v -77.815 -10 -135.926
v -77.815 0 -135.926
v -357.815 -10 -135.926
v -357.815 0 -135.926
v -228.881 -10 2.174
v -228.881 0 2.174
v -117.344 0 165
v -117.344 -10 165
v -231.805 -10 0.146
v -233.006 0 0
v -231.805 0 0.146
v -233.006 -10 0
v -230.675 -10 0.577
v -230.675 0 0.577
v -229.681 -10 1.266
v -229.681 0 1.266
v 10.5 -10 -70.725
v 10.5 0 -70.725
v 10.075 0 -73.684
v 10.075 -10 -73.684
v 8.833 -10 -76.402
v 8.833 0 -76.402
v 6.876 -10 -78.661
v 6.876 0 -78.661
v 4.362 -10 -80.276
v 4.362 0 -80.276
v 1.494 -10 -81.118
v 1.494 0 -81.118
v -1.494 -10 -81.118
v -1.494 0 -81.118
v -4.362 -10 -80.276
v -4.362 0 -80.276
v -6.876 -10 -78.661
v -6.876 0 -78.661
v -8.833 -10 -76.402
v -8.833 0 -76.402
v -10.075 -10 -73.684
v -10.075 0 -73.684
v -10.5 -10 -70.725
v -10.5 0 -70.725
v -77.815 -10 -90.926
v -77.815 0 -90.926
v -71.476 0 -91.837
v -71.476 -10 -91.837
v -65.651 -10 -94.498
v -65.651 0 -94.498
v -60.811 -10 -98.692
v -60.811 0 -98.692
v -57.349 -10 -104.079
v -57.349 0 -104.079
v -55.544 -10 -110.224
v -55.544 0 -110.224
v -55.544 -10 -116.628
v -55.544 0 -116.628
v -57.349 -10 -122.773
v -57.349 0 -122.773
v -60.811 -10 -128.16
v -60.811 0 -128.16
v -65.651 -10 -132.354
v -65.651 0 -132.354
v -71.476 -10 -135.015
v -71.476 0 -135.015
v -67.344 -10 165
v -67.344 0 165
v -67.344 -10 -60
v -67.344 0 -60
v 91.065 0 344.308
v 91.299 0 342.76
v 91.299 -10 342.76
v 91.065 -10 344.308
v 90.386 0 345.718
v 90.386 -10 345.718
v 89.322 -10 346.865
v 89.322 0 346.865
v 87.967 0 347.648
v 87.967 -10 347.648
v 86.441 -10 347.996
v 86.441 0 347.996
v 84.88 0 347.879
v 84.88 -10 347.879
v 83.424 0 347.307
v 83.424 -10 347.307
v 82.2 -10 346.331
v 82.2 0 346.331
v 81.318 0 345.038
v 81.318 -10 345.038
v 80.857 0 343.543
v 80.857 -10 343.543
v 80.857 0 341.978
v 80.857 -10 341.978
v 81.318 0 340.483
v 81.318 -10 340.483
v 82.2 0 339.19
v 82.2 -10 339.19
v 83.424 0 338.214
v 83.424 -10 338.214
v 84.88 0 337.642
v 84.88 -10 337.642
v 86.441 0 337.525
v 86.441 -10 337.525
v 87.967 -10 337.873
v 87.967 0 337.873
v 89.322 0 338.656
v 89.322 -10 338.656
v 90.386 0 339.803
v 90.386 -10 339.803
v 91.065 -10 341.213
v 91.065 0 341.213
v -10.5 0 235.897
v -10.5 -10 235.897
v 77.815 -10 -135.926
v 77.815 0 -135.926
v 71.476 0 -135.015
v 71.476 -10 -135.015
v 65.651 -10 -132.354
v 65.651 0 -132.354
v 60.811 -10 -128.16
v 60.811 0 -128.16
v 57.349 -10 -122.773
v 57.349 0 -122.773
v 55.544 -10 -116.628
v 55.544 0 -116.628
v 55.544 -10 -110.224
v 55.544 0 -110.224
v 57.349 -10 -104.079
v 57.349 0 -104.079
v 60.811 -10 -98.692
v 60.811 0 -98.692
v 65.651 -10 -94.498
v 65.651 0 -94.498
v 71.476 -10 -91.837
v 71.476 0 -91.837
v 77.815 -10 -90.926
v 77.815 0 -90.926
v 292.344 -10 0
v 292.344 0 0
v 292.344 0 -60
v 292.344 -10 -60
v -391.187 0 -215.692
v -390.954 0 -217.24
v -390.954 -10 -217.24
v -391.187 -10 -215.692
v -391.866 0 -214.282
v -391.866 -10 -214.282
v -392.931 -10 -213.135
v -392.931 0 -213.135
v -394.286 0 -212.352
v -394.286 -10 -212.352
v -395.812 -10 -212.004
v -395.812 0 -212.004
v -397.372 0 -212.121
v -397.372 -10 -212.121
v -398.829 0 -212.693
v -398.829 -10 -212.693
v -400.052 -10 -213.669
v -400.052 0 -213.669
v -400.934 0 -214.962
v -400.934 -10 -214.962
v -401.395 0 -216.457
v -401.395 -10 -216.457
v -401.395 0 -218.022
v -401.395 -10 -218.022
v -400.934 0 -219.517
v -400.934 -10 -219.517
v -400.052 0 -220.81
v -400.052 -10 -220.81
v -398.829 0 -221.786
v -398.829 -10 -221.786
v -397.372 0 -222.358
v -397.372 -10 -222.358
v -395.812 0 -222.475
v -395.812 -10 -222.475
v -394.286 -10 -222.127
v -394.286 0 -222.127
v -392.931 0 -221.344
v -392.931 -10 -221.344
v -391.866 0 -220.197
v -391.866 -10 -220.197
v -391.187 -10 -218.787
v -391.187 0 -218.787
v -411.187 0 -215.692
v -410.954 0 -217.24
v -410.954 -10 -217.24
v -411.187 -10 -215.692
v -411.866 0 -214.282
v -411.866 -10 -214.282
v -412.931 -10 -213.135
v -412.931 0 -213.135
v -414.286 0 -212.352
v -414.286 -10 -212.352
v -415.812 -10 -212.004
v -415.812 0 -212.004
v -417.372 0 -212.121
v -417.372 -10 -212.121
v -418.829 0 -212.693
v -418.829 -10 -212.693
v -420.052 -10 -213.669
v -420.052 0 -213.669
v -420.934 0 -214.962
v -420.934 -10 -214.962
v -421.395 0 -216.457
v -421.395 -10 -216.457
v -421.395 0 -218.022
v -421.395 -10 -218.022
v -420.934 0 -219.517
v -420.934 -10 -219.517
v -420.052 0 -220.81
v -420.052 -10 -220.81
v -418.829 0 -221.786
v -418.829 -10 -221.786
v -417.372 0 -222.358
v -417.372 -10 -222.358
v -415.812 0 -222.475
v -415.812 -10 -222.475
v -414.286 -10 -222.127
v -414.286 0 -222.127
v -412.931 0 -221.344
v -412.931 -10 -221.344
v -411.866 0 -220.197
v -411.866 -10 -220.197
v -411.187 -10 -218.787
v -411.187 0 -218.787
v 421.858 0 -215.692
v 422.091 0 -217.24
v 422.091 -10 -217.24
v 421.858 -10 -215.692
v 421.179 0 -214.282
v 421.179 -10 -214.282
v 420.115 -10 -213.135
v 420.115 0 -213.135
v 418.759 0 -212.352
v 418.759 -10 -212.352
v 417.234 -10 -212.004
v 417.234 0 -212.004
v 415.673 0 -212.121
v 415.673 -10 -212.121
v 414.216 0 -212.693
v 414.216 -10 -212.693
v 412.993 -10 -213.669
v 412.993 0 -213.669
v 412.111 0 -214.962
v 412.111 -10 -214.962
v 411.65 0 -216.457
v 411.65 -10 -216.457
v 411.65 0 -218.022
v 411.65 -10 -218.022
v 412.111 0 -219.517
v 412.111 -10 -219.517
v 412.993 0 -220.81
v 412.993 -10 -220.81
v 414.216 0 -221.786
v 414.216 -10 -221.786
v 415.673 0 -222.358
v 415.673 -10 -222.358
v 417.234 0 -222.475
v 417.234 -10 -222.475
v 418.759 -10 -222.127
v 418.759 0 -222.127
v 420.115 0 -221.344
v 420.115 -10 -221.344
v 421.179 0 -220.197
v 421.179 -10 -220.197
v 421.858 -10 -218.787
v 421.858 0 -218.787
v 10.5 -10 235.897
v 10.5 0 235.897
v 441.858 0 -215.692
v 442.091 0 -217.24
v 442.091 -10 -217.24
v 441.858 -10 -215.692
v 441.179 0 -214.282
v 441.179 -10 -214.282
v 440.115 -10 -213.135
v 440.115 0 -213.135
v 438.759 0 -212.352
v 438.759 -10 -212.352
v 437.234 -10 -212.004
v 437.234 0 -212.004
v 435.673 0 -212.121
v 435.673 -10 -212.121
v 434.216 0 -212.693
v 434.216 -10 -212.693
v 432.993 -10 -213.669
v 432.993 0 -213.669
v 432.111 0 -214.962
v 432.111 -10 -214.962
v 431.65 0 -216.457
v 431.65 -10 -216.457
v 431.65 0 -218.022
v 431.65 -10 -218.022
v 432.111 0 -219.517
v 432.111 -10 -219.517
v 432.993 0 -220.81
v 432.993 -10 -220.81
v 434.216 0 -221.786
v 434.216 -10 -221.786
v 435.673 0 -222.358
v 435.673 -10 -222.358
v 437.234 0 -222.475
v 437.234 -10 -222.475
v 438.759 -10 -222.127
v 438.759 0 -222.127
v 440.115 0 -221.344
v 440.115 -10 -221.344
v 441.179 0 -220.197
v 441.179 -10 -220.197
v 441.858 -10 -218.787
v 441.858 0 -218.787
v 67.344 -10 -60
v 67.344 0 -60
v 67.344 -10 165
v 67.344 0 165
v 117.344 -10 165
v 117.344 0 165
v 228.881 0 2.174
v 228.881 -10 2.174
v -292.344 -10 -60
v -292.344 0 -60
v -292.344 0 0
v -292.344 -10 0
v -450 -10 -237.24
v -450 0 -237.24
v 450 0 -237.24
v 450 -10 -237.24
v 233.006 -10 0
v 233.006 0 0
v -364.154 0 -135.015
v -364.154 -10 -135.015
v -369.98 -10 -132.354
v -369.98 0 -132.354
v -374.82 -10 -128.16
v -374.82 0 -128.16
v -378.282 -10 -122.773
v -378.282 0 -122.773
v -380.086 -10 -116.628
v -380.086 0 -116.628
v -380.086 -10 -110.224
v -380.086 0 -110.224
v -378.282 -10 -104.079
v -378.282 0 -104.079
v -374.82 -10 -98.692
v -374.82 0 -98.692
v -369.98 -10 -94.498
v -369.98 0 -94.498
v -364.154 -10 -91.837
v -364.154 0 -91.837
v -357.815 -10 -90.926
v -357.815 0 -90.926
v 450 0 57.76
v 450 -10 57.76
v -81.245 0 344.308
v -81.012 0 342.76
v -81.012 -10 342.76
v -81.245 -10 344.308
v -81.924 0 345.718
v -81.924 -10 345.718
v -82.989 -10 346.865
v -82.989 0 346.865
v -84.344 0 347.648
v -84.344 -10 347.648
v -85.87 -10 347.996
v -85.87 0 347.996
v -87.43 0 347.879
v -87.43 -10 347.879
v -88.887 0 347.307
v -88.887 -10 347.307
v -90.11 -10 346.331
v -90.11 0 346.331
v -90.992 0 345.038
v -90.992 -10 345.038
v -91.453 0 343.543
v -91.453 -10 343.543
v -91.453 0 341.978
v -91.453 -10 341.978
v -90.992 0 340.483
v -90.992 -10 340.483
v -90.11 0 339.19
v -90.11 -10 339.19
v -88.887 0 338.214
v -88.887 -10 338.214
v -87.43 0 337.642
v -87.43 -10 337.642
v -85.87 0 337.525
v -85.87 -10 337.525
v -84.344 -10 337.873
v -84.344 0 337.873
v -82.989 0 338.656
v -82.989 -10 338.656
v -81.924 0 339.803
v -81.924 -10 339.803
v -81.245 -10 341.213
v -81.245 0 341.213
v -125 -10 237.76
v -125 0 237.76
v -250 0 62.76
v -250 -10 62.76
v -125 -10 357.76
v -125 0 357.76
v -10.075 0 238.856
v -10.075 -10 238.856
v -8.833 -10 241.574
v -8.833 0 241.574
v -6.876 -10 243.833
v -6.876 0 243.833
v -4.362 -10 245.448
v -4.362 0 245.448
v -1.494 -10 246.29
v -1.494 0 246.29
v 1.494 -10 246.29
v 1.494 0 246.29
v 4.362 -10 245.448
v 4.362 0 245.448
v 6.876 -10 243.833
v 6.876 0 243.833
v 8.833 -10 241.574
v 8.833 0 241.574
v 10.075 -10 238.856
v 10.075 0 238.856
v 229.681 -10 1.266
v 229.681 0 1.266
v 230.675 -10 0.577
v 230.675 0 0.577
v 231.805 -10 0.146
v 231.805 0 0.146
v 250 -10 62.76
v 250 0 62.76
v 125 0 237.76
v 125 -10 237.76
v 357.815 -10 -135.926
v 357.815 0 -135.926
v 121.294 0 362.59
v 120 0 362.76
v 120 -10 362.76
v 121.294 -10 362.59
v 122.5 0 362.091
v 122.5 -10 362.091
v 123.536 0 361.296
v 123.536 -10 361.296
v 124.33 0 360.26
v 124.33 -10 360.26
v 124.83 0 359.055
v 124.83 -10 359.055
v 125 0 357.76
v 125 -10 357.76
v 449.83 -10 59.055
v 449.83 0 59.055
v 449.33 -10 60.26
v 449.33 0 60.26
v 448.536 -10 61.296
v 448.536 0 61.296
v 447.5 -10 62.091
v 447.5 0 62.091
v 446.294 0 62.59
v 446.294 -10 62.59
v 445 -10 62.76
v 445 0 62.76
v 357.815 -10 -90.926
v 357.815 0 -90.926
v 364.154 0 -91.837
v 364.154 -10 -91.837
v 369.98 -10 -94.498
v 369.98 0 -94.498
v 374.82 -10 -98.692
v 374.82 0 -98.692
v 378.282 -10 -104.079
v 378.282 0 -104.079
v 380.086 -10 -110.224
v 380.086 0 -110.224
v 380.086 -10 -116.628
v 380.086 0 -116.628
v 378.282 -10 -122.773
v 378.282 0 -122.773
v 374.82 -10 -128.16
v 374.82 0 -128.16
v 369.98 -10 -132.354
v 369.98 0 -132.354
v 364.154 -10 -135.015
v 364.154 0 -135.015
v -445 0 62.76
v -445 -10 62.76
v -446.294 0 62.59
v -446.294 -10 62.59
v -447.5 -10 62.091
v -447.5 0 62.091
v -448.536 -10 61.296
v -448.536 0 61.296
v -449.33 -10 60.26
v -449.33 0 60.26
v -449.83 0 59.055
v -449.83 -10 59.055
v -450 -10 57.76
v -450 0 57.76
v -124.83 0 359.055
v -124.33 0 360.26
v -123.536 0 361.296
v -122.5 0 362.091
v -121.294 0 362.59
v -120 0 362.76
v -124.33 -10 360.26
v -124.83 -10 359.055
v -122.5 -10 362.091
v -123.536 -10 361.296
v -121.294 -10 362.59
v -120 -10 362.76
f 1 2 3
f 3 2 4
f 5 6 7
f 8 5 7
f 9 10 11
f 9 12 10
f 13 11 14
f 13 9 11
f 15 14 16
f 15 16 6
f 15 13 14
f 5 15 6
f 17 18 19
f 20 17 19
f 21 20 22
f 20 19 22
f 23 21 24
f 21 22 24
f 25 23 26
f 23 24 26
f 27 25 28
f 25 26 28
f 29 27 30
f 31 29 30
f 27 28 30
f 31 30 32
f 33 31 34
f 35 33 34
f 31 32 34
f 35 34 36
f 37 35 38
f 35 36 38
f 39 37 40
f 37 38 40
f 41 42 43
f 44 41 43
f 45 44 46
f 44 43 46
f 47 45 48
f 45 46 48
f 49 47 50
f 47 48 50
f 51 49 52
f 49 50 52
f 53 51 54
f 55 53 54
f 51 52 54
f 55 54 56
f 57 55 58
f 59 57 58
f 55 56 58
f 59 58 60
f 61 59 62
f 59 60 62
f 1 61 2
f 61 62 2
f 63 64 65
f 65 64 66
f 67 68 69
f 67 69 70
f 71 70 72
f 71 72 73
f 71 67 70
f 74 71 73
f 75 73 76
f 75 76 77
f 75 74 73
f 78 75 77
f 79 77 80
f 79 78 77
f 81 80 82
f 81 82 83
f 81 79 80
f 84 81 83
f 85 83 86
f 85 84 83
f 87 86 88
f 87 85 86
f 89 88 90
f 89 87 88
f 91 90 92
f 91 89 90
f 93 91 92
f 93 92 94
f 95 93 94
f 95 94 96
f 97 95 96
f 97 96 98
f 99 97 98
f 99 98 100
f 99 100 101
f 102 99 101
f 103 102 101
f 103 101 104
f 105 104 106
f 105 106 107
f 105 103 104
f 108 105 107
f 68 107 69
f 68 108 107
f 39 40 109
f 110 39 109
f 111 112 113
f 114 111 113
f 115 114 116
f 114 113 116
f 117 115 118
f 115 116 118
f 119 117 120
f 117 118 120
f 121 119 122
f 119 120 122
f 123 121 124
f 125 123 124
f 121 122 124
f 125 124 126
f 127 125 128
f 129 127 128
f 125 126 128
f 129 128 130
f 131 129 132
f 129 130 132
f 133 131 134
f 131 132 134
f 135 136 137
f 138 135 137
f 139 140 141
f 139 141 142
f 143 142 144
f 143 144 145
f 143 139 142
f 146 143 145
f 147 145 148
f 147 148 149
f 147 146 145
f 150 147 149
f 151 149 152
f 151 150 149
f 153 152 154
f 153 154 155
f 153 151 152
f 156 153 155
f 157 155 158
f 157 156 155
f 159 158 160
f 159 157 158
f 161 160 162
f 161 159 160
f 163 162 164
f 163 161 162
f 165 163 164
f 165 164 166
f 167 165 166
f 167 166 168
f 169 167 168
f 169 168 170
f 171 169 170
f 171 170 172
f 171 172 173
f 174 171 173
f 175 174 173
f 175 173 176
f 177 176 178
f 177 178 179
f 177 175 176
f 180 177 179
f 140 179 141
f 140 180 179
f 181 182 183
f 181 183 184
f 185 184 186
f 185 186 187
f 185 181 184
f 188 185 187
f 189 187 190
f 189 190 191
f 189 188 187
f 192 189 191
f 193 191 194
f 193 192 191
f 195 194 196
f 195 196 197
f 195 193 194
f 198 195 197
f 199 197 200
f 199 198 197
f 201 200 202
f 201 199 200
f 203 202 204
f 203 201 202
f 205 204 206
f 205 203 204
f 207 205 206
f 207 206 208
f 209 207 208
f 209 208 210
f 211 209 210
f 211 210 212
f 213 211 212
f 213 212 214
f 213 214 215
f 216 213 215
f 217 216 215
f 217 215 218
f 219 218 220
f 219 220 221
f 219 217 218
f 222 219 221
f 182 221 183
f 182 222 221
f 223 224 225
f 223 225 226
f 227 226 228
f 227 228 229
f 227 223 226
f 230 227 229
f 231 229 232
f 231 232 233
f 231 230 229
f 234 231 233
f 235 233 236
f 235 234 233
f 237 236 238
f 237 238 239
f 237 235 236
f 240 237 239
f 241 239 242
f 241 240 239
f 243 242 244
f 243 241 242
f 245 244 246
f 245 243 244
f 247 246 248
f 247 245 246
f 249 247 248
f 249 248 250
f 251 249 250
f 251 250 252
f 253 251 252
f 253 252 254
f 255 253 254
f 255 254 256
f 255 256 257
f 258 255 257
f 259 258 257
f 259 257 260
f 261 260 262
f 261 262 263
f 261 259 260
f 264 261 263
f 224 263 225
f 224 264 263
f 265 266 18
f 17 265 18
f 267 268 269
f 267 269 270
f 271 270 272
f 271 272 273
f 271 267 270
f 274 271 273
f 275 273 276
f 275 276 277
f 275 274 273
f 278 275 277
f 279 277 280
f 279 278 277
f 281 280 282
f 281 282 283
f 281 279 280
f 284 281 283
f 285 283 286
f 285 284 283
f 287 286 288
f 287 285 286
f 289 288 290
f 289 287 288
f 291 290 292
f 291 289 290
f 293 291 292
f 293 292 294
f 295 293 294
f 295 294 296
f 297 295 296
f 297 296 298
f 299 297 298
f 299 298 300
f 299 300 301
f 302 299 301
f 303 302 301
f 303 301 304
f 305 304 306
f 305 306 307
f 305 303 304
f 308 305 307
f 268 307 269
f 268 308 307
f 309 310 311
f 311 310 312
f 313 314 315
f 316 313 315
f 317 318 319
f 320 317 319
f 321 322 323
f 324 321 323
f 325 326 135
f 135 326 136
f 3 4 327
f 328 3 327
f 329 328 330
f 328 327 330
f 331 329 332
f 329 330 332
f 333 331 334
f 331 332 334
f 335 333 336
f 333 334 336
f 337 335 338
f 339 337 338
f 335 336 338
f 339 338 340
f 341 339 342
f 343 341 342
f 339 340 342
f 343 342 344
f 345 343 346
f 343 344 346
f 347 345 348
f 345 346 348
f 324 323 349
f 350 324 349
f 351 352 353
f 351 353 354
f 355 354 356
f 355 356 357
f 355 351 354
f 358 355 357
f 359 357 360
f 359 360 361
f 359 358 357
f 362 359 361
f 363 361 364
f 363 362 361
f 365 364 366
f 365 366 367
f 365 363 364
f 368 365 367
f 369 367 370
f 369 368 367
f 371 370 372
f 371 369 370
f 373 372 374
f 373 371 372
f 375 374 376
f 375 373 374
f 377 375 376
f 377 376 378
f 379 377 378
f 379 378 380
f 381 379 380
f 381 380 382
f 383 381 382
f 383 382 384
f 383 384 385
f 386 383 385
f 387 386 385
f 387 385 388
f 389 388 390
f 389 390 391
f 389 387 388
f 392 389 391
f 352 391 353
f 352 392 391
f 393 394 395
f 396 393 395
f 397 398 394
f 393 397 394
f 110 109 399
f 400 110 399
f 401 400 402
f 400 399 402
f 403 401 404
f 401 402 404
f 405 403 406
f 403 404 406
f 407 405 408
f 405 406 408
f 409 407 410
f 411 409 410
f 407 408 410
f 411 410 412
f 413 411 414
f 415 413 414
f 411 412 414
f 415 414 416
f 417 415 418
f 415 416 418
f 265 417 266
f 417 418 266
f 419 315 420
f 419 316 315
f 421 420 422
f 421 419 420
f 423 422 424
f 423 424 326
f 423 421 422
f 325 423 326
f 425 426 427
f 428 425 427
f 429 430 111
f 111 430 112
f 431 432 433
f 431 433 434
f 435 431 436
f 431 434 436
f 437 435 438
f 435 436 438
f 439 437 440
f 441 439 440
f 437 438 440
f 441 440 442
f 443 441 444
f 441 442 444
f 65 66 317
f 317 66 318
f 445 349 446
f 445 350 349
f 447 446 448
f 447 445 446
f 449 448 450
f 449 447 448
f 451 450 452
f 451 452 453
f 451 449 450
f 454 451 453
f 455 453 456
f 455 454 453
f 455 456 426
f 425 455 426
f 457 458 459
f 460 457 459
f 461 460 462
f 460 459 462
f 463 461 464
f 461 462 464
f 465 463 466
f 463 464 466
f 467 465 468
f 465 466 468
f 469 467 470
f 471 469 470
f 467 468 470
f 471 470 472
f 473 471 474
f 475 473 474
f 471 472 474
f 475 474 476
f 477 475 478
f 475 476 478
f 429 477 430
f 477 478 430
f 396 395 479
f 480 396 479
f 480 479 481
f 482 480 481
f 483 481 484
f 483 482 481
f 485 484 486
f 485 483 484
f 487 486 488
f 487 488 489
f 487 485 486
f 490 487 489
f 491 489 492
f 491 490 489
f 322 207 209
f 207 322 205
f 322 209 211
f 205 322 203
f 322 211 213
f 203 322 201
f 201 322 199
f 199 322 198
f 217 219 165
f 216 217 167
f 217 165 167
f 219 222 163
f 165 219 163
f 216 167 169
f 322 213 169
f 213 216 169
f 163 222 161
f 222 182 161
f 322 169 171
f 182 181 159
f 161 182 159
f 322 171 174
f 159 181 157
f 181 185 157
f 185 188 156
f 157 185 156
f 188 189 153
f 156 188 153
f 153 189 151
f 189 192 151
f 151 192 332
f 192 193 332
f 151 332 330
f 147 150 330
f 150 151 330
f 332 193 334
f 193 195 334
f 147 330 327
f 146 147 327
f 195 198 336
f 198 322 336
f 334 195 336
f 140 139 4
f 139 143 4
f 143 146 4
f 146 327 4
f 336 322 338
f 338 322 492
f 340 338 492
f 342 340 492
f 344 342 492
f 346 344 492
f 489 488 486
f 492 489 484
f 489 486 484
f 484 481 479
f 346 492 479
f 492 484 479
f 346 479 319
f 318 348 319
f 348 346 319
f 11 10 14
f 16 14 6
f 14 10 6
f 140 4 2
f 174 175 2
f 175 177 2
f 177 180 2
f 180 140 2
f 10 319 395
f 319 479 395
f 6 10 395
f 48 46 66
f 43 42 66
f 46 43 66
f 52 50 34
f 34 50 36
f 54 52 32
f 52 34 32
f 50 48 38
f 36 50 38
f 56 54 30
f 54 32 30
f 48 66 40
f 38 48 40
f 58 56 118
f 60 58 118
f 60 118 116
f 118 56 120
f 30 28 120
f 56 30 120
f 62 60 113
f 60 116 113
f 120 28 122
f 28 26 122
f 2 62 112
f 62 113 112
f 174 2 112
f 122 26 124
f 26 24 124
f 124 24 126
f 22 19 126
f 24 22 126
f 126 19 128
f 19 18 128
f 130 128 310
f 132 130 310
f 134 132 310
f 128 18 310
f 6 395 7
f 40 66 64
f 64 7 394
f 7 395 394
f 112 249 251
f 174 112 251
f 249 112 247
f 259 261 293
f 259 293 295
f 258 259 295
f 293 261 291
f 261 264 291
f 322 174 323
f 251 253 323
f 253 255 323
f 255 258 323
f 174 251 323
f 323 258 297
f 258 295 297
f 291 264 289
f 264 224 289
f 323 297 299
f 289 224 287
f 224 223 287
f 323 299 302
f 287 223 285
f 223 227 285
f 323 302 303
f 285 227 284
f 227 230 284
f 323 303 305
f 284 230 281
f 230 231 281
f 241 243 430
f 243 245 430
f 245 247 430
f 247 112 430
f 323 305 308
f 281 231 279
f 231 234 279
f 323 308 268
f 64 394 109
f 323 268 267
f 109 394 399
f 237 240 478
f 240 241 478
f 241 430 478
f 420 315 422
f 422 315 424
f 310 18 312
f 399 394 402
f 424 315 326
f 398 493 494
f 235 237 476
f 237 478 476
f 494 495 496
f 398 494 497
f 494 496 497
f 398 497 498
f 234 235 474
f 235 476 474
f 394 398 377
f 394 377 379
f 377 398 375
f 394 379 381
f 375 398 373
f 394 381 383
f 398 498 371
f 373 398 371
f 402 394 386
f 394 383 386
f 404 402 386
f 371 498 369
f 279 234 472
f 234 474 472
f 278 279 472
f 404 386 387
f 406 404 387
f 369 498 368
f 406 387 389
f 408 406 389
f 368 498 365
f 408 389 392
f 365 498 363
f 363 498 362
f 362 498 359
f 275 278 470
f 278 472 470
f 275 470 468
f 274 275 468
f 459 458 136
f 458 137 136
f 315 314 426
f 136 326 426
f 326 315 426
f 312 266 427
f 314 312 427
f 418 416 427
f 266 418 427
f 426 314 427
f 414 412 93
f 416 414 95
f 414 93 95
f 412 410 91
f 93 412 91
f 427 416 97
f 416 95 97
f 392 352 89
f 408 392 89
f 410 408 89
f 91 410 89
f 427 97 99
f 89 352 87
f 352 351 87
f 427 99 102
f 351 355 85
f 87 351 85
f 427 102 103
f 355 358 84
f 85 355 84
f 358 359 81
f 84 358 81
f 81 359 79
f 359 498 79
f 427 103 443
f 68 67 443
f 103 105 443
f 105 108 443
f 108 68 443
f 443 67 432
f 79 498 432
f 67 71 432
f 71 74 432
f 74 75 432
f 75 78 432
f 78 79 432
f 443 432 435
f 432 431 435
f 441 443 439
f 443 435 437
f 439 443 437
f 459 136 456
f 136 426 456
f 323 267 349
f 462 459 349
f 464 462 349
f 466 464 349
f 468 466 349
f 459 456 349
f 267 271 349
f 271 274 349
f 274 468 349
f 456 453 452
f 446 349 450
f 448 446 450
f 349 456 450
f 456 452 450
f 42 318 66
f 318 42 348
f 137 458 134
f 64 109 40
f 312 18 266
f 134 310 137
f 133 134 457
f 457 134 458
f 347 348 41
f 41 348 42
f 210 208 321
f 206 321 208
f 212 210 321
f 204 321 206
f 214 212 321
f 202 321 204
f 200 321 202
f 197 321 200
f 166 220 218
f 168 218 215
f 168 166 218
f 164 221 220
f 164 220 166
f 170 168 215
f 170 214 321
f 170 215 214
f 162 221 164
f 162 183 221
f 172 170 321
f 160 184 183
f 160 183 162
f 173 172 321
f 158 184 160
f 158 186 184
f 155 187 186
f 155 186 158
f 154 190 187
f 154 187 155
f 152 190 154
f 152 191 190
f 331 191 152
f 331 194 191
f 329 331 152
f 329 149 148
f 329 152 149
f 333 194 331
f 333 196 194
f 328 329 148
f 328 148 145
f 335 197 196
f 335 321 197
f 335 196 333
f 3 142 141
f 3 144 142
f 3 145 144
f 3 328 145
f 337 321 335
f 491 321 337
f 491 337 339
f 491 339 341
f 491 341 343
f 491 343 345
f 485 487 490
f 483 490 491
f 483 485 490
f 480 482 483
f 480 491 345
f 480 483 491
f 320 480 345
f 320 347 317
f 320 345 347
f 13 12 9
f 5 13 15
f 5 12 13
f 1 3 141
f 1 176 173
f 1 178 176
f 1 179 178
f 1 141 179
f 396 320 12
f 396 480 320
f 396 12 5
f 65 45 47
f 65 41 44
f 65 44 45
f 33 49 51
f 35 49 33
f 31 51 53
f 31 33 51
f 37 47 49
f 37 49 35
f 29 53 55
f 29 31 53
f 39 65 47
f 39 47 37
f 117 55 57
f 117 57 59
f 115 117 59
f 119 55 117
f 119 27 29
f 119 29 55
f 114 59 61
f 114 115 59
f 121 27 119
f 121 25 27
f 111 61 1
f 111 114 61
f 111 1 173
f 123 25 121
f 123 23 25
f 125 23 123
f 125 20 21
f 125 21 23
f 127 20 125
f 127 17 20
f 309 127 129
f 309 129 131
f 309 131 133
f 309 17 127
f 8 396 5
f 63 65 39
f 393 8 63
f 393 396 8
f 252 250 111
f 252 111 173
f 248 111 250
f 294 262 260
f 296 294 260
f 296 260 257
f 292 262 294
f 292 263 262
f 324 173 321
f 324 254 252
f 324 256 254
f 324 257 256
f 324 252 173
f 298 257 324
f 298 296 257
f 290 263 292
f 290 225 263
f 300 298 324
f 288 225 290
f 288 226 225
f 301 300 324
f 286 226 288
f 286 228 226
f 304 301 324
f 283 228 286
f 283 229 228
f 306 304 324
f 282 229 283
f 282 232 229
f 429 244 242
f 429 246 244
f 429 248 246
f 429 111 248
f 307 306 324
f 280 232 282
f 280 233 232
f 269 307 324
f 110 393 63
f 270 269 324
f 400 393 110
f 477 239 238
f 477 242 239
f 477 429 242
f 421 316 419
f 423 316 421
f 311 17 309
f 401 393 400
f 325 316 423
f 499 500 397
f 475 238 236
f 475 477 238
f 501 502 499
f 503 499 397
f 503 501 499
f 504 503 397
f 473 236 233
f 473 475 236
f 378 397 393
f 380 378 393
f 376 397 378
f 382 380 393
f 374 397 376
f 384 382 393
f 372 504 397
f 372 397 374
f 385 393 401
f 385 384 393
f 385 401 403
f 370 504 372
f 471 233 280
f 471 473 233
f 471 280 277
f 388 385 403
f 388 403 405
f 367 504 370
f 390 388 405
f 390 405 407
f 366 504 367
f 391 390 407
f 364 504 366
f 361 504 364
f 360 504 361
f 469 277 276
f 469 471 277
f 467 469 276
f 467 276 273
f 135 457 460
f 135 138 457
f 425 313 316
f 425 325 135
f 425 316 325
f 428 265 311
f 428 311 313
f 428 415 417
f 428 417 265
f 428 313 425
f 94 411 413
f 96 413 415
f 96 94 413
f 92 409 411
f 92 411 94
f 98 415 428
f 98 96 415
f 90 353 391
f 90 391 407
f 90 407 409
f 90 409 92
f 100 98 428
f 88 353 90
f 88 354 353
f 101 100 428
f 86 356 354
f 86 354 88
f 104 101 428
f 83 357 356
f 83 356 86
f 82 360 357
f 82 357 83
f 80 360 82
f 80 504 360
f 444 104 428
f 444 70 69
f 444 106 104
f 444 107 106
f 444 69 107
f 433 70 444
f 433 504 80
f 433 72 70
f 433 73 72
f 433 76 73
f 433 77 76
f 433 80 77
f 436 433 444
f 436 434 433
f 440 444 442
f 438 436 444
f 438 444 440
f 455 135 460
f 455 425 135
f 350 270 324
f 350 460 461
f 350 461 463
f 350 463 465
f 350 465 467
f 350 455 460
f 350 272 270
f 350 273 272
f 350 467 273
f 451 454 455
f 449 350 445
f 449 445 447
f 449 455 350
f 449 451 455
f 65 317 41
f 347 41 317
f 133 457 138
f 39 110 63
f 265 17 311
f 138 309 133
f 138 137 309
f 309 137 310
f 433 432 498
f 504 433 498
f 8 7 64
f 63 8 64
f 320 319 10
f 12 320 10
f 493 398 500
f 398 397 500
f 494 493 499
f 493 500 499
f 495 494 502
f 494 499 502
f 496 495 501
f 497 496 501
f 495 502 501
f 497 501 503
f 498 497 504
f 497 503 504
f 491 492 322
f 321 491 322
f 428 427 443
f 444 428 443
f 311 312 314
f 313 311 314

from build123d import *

# Parameters (mm, degrees)
F0_R     = 5.25
F1_DEPTH = 10
F2_R     = 5
F3_R     = 5


with BuildPart() as f1:
    # F0 (on Front) → F1 (new body)
    with BuildSketch(Plane.XZ):
        Polygon((-250, 62.760484), (-450, 62.760484), (-450, -237.239516), (0, -237.239516), (450, -237.239516), (450, 62.760484), (250, 62.760484), (125, 237.760484), (125, 362.760484), (-125, 362.760484), (-125, 237.760484), align=None)
        with Locations((-416.203916, -217.239516)):
            Circle(F0_R, mode=Mode.SUBTRACT)
        with Locations((-396.203916, -217.239516)):
            Circle(F0_R, mode=Mode.SUBTRACT)
        with BuildLine():
            Line((-357.815236, -90.926083), (-77.815236, -90.926083))
            ThreePointArc((-77.815236, -90.926083), (-55.315236, -113.426083), (-77.815236, -135.926083))
            Line((-77.815236, -135.926083), (-357.815236, -135.926083))
            ThreePointArc((-357.815236, -135.926083), (-380.315236, -113.426083), (-357.815236, -90.926083))
        make_face(mode=Mode.SUBTRACT)
        Polygon((-292.343991, -60), (-292.343991, 0), (-230.370536, 0), (-117.343991, 165), (-67.343991, 165), (-67.343991, 0), (-67.343991, -60), align=None, mode=Mode.SUBTRACT)
        with BuildLine():
            ThreePointArc((77.815236, -135.926083), (55.315236, -113.426083), (77.815236, -90.926083))
            Line((77.815236, -90.926083), (357.815236, -90.926083))
            ThreePointArc((357.815236, -90.926083), (380.315236, -113.426083), (357.815236, -135.926083))
            Line((357.815236, -135.926083), (77.815236, -135.926083))
        make_face(mode=Mode.SUBTRACT)
        with Locations((416.841447, -217.239516)):
            Circle(F0_R, mode=Mode.SUBTRACT)
        with Locations((436.841447, -217.239516)):
            Circle(F0_R, mode=Mode.SUBTRACT)
        Polygon((67.343991, 0), (67.343991, 165), (117.343991, 165), (230.370536, 0), (292.343991, 0), (292.343991, -60), (67.343991, -60), align=None, mode=Mode.SUBTRACT)
        with Locations((-86.261913, 342.760484)):
            Circle(F0_R, mode=Mode.SUBTRACT)
        with BuildLine():
            Line((-10.5, 0), (-10.5, 235.897347))
            ThreePointArc((-10.5, 235.897347), (0, 246.397347), (10.5, 235.897347))
            Line((10.5, 235.897347), (10.5, 0))
            Line((10.5, 0), (10.5, -70.725352))
            ThreePointArc((10.5, -70.725352), (0, -81.225352), (-10.5, -70.725352))
            Line((-10.5, -70.725352), (-10.5, 0))
        make_face(mode=Mode.SUBTRACT)
        with Locations((86.048543, 342.760484)):
            Circle(F0_R, mode=Mode.SUBTRACT)
    extrude(amount=F1_DEPTH)

    # F2
    f2_edges = [f1.edges().sort_by_distance(p)[0] for p in [
        (-230.370536, -5, 0),
        (230.370536, -5, 0),
    ]]
    fillet(f2_edges, radius=F2_R)

    # F3
    f3_edges = [f1.edges().sort_by_distance(p)[0] for p in [
        (-450, -5, 62.760484),
        (-125, -5, 362.760484),
        (125, -5, 362.760484),
        (450, -5, 62.760484),
    ]]
    fillet(f3_edges, radius=F3_R)


solid = f1.part
